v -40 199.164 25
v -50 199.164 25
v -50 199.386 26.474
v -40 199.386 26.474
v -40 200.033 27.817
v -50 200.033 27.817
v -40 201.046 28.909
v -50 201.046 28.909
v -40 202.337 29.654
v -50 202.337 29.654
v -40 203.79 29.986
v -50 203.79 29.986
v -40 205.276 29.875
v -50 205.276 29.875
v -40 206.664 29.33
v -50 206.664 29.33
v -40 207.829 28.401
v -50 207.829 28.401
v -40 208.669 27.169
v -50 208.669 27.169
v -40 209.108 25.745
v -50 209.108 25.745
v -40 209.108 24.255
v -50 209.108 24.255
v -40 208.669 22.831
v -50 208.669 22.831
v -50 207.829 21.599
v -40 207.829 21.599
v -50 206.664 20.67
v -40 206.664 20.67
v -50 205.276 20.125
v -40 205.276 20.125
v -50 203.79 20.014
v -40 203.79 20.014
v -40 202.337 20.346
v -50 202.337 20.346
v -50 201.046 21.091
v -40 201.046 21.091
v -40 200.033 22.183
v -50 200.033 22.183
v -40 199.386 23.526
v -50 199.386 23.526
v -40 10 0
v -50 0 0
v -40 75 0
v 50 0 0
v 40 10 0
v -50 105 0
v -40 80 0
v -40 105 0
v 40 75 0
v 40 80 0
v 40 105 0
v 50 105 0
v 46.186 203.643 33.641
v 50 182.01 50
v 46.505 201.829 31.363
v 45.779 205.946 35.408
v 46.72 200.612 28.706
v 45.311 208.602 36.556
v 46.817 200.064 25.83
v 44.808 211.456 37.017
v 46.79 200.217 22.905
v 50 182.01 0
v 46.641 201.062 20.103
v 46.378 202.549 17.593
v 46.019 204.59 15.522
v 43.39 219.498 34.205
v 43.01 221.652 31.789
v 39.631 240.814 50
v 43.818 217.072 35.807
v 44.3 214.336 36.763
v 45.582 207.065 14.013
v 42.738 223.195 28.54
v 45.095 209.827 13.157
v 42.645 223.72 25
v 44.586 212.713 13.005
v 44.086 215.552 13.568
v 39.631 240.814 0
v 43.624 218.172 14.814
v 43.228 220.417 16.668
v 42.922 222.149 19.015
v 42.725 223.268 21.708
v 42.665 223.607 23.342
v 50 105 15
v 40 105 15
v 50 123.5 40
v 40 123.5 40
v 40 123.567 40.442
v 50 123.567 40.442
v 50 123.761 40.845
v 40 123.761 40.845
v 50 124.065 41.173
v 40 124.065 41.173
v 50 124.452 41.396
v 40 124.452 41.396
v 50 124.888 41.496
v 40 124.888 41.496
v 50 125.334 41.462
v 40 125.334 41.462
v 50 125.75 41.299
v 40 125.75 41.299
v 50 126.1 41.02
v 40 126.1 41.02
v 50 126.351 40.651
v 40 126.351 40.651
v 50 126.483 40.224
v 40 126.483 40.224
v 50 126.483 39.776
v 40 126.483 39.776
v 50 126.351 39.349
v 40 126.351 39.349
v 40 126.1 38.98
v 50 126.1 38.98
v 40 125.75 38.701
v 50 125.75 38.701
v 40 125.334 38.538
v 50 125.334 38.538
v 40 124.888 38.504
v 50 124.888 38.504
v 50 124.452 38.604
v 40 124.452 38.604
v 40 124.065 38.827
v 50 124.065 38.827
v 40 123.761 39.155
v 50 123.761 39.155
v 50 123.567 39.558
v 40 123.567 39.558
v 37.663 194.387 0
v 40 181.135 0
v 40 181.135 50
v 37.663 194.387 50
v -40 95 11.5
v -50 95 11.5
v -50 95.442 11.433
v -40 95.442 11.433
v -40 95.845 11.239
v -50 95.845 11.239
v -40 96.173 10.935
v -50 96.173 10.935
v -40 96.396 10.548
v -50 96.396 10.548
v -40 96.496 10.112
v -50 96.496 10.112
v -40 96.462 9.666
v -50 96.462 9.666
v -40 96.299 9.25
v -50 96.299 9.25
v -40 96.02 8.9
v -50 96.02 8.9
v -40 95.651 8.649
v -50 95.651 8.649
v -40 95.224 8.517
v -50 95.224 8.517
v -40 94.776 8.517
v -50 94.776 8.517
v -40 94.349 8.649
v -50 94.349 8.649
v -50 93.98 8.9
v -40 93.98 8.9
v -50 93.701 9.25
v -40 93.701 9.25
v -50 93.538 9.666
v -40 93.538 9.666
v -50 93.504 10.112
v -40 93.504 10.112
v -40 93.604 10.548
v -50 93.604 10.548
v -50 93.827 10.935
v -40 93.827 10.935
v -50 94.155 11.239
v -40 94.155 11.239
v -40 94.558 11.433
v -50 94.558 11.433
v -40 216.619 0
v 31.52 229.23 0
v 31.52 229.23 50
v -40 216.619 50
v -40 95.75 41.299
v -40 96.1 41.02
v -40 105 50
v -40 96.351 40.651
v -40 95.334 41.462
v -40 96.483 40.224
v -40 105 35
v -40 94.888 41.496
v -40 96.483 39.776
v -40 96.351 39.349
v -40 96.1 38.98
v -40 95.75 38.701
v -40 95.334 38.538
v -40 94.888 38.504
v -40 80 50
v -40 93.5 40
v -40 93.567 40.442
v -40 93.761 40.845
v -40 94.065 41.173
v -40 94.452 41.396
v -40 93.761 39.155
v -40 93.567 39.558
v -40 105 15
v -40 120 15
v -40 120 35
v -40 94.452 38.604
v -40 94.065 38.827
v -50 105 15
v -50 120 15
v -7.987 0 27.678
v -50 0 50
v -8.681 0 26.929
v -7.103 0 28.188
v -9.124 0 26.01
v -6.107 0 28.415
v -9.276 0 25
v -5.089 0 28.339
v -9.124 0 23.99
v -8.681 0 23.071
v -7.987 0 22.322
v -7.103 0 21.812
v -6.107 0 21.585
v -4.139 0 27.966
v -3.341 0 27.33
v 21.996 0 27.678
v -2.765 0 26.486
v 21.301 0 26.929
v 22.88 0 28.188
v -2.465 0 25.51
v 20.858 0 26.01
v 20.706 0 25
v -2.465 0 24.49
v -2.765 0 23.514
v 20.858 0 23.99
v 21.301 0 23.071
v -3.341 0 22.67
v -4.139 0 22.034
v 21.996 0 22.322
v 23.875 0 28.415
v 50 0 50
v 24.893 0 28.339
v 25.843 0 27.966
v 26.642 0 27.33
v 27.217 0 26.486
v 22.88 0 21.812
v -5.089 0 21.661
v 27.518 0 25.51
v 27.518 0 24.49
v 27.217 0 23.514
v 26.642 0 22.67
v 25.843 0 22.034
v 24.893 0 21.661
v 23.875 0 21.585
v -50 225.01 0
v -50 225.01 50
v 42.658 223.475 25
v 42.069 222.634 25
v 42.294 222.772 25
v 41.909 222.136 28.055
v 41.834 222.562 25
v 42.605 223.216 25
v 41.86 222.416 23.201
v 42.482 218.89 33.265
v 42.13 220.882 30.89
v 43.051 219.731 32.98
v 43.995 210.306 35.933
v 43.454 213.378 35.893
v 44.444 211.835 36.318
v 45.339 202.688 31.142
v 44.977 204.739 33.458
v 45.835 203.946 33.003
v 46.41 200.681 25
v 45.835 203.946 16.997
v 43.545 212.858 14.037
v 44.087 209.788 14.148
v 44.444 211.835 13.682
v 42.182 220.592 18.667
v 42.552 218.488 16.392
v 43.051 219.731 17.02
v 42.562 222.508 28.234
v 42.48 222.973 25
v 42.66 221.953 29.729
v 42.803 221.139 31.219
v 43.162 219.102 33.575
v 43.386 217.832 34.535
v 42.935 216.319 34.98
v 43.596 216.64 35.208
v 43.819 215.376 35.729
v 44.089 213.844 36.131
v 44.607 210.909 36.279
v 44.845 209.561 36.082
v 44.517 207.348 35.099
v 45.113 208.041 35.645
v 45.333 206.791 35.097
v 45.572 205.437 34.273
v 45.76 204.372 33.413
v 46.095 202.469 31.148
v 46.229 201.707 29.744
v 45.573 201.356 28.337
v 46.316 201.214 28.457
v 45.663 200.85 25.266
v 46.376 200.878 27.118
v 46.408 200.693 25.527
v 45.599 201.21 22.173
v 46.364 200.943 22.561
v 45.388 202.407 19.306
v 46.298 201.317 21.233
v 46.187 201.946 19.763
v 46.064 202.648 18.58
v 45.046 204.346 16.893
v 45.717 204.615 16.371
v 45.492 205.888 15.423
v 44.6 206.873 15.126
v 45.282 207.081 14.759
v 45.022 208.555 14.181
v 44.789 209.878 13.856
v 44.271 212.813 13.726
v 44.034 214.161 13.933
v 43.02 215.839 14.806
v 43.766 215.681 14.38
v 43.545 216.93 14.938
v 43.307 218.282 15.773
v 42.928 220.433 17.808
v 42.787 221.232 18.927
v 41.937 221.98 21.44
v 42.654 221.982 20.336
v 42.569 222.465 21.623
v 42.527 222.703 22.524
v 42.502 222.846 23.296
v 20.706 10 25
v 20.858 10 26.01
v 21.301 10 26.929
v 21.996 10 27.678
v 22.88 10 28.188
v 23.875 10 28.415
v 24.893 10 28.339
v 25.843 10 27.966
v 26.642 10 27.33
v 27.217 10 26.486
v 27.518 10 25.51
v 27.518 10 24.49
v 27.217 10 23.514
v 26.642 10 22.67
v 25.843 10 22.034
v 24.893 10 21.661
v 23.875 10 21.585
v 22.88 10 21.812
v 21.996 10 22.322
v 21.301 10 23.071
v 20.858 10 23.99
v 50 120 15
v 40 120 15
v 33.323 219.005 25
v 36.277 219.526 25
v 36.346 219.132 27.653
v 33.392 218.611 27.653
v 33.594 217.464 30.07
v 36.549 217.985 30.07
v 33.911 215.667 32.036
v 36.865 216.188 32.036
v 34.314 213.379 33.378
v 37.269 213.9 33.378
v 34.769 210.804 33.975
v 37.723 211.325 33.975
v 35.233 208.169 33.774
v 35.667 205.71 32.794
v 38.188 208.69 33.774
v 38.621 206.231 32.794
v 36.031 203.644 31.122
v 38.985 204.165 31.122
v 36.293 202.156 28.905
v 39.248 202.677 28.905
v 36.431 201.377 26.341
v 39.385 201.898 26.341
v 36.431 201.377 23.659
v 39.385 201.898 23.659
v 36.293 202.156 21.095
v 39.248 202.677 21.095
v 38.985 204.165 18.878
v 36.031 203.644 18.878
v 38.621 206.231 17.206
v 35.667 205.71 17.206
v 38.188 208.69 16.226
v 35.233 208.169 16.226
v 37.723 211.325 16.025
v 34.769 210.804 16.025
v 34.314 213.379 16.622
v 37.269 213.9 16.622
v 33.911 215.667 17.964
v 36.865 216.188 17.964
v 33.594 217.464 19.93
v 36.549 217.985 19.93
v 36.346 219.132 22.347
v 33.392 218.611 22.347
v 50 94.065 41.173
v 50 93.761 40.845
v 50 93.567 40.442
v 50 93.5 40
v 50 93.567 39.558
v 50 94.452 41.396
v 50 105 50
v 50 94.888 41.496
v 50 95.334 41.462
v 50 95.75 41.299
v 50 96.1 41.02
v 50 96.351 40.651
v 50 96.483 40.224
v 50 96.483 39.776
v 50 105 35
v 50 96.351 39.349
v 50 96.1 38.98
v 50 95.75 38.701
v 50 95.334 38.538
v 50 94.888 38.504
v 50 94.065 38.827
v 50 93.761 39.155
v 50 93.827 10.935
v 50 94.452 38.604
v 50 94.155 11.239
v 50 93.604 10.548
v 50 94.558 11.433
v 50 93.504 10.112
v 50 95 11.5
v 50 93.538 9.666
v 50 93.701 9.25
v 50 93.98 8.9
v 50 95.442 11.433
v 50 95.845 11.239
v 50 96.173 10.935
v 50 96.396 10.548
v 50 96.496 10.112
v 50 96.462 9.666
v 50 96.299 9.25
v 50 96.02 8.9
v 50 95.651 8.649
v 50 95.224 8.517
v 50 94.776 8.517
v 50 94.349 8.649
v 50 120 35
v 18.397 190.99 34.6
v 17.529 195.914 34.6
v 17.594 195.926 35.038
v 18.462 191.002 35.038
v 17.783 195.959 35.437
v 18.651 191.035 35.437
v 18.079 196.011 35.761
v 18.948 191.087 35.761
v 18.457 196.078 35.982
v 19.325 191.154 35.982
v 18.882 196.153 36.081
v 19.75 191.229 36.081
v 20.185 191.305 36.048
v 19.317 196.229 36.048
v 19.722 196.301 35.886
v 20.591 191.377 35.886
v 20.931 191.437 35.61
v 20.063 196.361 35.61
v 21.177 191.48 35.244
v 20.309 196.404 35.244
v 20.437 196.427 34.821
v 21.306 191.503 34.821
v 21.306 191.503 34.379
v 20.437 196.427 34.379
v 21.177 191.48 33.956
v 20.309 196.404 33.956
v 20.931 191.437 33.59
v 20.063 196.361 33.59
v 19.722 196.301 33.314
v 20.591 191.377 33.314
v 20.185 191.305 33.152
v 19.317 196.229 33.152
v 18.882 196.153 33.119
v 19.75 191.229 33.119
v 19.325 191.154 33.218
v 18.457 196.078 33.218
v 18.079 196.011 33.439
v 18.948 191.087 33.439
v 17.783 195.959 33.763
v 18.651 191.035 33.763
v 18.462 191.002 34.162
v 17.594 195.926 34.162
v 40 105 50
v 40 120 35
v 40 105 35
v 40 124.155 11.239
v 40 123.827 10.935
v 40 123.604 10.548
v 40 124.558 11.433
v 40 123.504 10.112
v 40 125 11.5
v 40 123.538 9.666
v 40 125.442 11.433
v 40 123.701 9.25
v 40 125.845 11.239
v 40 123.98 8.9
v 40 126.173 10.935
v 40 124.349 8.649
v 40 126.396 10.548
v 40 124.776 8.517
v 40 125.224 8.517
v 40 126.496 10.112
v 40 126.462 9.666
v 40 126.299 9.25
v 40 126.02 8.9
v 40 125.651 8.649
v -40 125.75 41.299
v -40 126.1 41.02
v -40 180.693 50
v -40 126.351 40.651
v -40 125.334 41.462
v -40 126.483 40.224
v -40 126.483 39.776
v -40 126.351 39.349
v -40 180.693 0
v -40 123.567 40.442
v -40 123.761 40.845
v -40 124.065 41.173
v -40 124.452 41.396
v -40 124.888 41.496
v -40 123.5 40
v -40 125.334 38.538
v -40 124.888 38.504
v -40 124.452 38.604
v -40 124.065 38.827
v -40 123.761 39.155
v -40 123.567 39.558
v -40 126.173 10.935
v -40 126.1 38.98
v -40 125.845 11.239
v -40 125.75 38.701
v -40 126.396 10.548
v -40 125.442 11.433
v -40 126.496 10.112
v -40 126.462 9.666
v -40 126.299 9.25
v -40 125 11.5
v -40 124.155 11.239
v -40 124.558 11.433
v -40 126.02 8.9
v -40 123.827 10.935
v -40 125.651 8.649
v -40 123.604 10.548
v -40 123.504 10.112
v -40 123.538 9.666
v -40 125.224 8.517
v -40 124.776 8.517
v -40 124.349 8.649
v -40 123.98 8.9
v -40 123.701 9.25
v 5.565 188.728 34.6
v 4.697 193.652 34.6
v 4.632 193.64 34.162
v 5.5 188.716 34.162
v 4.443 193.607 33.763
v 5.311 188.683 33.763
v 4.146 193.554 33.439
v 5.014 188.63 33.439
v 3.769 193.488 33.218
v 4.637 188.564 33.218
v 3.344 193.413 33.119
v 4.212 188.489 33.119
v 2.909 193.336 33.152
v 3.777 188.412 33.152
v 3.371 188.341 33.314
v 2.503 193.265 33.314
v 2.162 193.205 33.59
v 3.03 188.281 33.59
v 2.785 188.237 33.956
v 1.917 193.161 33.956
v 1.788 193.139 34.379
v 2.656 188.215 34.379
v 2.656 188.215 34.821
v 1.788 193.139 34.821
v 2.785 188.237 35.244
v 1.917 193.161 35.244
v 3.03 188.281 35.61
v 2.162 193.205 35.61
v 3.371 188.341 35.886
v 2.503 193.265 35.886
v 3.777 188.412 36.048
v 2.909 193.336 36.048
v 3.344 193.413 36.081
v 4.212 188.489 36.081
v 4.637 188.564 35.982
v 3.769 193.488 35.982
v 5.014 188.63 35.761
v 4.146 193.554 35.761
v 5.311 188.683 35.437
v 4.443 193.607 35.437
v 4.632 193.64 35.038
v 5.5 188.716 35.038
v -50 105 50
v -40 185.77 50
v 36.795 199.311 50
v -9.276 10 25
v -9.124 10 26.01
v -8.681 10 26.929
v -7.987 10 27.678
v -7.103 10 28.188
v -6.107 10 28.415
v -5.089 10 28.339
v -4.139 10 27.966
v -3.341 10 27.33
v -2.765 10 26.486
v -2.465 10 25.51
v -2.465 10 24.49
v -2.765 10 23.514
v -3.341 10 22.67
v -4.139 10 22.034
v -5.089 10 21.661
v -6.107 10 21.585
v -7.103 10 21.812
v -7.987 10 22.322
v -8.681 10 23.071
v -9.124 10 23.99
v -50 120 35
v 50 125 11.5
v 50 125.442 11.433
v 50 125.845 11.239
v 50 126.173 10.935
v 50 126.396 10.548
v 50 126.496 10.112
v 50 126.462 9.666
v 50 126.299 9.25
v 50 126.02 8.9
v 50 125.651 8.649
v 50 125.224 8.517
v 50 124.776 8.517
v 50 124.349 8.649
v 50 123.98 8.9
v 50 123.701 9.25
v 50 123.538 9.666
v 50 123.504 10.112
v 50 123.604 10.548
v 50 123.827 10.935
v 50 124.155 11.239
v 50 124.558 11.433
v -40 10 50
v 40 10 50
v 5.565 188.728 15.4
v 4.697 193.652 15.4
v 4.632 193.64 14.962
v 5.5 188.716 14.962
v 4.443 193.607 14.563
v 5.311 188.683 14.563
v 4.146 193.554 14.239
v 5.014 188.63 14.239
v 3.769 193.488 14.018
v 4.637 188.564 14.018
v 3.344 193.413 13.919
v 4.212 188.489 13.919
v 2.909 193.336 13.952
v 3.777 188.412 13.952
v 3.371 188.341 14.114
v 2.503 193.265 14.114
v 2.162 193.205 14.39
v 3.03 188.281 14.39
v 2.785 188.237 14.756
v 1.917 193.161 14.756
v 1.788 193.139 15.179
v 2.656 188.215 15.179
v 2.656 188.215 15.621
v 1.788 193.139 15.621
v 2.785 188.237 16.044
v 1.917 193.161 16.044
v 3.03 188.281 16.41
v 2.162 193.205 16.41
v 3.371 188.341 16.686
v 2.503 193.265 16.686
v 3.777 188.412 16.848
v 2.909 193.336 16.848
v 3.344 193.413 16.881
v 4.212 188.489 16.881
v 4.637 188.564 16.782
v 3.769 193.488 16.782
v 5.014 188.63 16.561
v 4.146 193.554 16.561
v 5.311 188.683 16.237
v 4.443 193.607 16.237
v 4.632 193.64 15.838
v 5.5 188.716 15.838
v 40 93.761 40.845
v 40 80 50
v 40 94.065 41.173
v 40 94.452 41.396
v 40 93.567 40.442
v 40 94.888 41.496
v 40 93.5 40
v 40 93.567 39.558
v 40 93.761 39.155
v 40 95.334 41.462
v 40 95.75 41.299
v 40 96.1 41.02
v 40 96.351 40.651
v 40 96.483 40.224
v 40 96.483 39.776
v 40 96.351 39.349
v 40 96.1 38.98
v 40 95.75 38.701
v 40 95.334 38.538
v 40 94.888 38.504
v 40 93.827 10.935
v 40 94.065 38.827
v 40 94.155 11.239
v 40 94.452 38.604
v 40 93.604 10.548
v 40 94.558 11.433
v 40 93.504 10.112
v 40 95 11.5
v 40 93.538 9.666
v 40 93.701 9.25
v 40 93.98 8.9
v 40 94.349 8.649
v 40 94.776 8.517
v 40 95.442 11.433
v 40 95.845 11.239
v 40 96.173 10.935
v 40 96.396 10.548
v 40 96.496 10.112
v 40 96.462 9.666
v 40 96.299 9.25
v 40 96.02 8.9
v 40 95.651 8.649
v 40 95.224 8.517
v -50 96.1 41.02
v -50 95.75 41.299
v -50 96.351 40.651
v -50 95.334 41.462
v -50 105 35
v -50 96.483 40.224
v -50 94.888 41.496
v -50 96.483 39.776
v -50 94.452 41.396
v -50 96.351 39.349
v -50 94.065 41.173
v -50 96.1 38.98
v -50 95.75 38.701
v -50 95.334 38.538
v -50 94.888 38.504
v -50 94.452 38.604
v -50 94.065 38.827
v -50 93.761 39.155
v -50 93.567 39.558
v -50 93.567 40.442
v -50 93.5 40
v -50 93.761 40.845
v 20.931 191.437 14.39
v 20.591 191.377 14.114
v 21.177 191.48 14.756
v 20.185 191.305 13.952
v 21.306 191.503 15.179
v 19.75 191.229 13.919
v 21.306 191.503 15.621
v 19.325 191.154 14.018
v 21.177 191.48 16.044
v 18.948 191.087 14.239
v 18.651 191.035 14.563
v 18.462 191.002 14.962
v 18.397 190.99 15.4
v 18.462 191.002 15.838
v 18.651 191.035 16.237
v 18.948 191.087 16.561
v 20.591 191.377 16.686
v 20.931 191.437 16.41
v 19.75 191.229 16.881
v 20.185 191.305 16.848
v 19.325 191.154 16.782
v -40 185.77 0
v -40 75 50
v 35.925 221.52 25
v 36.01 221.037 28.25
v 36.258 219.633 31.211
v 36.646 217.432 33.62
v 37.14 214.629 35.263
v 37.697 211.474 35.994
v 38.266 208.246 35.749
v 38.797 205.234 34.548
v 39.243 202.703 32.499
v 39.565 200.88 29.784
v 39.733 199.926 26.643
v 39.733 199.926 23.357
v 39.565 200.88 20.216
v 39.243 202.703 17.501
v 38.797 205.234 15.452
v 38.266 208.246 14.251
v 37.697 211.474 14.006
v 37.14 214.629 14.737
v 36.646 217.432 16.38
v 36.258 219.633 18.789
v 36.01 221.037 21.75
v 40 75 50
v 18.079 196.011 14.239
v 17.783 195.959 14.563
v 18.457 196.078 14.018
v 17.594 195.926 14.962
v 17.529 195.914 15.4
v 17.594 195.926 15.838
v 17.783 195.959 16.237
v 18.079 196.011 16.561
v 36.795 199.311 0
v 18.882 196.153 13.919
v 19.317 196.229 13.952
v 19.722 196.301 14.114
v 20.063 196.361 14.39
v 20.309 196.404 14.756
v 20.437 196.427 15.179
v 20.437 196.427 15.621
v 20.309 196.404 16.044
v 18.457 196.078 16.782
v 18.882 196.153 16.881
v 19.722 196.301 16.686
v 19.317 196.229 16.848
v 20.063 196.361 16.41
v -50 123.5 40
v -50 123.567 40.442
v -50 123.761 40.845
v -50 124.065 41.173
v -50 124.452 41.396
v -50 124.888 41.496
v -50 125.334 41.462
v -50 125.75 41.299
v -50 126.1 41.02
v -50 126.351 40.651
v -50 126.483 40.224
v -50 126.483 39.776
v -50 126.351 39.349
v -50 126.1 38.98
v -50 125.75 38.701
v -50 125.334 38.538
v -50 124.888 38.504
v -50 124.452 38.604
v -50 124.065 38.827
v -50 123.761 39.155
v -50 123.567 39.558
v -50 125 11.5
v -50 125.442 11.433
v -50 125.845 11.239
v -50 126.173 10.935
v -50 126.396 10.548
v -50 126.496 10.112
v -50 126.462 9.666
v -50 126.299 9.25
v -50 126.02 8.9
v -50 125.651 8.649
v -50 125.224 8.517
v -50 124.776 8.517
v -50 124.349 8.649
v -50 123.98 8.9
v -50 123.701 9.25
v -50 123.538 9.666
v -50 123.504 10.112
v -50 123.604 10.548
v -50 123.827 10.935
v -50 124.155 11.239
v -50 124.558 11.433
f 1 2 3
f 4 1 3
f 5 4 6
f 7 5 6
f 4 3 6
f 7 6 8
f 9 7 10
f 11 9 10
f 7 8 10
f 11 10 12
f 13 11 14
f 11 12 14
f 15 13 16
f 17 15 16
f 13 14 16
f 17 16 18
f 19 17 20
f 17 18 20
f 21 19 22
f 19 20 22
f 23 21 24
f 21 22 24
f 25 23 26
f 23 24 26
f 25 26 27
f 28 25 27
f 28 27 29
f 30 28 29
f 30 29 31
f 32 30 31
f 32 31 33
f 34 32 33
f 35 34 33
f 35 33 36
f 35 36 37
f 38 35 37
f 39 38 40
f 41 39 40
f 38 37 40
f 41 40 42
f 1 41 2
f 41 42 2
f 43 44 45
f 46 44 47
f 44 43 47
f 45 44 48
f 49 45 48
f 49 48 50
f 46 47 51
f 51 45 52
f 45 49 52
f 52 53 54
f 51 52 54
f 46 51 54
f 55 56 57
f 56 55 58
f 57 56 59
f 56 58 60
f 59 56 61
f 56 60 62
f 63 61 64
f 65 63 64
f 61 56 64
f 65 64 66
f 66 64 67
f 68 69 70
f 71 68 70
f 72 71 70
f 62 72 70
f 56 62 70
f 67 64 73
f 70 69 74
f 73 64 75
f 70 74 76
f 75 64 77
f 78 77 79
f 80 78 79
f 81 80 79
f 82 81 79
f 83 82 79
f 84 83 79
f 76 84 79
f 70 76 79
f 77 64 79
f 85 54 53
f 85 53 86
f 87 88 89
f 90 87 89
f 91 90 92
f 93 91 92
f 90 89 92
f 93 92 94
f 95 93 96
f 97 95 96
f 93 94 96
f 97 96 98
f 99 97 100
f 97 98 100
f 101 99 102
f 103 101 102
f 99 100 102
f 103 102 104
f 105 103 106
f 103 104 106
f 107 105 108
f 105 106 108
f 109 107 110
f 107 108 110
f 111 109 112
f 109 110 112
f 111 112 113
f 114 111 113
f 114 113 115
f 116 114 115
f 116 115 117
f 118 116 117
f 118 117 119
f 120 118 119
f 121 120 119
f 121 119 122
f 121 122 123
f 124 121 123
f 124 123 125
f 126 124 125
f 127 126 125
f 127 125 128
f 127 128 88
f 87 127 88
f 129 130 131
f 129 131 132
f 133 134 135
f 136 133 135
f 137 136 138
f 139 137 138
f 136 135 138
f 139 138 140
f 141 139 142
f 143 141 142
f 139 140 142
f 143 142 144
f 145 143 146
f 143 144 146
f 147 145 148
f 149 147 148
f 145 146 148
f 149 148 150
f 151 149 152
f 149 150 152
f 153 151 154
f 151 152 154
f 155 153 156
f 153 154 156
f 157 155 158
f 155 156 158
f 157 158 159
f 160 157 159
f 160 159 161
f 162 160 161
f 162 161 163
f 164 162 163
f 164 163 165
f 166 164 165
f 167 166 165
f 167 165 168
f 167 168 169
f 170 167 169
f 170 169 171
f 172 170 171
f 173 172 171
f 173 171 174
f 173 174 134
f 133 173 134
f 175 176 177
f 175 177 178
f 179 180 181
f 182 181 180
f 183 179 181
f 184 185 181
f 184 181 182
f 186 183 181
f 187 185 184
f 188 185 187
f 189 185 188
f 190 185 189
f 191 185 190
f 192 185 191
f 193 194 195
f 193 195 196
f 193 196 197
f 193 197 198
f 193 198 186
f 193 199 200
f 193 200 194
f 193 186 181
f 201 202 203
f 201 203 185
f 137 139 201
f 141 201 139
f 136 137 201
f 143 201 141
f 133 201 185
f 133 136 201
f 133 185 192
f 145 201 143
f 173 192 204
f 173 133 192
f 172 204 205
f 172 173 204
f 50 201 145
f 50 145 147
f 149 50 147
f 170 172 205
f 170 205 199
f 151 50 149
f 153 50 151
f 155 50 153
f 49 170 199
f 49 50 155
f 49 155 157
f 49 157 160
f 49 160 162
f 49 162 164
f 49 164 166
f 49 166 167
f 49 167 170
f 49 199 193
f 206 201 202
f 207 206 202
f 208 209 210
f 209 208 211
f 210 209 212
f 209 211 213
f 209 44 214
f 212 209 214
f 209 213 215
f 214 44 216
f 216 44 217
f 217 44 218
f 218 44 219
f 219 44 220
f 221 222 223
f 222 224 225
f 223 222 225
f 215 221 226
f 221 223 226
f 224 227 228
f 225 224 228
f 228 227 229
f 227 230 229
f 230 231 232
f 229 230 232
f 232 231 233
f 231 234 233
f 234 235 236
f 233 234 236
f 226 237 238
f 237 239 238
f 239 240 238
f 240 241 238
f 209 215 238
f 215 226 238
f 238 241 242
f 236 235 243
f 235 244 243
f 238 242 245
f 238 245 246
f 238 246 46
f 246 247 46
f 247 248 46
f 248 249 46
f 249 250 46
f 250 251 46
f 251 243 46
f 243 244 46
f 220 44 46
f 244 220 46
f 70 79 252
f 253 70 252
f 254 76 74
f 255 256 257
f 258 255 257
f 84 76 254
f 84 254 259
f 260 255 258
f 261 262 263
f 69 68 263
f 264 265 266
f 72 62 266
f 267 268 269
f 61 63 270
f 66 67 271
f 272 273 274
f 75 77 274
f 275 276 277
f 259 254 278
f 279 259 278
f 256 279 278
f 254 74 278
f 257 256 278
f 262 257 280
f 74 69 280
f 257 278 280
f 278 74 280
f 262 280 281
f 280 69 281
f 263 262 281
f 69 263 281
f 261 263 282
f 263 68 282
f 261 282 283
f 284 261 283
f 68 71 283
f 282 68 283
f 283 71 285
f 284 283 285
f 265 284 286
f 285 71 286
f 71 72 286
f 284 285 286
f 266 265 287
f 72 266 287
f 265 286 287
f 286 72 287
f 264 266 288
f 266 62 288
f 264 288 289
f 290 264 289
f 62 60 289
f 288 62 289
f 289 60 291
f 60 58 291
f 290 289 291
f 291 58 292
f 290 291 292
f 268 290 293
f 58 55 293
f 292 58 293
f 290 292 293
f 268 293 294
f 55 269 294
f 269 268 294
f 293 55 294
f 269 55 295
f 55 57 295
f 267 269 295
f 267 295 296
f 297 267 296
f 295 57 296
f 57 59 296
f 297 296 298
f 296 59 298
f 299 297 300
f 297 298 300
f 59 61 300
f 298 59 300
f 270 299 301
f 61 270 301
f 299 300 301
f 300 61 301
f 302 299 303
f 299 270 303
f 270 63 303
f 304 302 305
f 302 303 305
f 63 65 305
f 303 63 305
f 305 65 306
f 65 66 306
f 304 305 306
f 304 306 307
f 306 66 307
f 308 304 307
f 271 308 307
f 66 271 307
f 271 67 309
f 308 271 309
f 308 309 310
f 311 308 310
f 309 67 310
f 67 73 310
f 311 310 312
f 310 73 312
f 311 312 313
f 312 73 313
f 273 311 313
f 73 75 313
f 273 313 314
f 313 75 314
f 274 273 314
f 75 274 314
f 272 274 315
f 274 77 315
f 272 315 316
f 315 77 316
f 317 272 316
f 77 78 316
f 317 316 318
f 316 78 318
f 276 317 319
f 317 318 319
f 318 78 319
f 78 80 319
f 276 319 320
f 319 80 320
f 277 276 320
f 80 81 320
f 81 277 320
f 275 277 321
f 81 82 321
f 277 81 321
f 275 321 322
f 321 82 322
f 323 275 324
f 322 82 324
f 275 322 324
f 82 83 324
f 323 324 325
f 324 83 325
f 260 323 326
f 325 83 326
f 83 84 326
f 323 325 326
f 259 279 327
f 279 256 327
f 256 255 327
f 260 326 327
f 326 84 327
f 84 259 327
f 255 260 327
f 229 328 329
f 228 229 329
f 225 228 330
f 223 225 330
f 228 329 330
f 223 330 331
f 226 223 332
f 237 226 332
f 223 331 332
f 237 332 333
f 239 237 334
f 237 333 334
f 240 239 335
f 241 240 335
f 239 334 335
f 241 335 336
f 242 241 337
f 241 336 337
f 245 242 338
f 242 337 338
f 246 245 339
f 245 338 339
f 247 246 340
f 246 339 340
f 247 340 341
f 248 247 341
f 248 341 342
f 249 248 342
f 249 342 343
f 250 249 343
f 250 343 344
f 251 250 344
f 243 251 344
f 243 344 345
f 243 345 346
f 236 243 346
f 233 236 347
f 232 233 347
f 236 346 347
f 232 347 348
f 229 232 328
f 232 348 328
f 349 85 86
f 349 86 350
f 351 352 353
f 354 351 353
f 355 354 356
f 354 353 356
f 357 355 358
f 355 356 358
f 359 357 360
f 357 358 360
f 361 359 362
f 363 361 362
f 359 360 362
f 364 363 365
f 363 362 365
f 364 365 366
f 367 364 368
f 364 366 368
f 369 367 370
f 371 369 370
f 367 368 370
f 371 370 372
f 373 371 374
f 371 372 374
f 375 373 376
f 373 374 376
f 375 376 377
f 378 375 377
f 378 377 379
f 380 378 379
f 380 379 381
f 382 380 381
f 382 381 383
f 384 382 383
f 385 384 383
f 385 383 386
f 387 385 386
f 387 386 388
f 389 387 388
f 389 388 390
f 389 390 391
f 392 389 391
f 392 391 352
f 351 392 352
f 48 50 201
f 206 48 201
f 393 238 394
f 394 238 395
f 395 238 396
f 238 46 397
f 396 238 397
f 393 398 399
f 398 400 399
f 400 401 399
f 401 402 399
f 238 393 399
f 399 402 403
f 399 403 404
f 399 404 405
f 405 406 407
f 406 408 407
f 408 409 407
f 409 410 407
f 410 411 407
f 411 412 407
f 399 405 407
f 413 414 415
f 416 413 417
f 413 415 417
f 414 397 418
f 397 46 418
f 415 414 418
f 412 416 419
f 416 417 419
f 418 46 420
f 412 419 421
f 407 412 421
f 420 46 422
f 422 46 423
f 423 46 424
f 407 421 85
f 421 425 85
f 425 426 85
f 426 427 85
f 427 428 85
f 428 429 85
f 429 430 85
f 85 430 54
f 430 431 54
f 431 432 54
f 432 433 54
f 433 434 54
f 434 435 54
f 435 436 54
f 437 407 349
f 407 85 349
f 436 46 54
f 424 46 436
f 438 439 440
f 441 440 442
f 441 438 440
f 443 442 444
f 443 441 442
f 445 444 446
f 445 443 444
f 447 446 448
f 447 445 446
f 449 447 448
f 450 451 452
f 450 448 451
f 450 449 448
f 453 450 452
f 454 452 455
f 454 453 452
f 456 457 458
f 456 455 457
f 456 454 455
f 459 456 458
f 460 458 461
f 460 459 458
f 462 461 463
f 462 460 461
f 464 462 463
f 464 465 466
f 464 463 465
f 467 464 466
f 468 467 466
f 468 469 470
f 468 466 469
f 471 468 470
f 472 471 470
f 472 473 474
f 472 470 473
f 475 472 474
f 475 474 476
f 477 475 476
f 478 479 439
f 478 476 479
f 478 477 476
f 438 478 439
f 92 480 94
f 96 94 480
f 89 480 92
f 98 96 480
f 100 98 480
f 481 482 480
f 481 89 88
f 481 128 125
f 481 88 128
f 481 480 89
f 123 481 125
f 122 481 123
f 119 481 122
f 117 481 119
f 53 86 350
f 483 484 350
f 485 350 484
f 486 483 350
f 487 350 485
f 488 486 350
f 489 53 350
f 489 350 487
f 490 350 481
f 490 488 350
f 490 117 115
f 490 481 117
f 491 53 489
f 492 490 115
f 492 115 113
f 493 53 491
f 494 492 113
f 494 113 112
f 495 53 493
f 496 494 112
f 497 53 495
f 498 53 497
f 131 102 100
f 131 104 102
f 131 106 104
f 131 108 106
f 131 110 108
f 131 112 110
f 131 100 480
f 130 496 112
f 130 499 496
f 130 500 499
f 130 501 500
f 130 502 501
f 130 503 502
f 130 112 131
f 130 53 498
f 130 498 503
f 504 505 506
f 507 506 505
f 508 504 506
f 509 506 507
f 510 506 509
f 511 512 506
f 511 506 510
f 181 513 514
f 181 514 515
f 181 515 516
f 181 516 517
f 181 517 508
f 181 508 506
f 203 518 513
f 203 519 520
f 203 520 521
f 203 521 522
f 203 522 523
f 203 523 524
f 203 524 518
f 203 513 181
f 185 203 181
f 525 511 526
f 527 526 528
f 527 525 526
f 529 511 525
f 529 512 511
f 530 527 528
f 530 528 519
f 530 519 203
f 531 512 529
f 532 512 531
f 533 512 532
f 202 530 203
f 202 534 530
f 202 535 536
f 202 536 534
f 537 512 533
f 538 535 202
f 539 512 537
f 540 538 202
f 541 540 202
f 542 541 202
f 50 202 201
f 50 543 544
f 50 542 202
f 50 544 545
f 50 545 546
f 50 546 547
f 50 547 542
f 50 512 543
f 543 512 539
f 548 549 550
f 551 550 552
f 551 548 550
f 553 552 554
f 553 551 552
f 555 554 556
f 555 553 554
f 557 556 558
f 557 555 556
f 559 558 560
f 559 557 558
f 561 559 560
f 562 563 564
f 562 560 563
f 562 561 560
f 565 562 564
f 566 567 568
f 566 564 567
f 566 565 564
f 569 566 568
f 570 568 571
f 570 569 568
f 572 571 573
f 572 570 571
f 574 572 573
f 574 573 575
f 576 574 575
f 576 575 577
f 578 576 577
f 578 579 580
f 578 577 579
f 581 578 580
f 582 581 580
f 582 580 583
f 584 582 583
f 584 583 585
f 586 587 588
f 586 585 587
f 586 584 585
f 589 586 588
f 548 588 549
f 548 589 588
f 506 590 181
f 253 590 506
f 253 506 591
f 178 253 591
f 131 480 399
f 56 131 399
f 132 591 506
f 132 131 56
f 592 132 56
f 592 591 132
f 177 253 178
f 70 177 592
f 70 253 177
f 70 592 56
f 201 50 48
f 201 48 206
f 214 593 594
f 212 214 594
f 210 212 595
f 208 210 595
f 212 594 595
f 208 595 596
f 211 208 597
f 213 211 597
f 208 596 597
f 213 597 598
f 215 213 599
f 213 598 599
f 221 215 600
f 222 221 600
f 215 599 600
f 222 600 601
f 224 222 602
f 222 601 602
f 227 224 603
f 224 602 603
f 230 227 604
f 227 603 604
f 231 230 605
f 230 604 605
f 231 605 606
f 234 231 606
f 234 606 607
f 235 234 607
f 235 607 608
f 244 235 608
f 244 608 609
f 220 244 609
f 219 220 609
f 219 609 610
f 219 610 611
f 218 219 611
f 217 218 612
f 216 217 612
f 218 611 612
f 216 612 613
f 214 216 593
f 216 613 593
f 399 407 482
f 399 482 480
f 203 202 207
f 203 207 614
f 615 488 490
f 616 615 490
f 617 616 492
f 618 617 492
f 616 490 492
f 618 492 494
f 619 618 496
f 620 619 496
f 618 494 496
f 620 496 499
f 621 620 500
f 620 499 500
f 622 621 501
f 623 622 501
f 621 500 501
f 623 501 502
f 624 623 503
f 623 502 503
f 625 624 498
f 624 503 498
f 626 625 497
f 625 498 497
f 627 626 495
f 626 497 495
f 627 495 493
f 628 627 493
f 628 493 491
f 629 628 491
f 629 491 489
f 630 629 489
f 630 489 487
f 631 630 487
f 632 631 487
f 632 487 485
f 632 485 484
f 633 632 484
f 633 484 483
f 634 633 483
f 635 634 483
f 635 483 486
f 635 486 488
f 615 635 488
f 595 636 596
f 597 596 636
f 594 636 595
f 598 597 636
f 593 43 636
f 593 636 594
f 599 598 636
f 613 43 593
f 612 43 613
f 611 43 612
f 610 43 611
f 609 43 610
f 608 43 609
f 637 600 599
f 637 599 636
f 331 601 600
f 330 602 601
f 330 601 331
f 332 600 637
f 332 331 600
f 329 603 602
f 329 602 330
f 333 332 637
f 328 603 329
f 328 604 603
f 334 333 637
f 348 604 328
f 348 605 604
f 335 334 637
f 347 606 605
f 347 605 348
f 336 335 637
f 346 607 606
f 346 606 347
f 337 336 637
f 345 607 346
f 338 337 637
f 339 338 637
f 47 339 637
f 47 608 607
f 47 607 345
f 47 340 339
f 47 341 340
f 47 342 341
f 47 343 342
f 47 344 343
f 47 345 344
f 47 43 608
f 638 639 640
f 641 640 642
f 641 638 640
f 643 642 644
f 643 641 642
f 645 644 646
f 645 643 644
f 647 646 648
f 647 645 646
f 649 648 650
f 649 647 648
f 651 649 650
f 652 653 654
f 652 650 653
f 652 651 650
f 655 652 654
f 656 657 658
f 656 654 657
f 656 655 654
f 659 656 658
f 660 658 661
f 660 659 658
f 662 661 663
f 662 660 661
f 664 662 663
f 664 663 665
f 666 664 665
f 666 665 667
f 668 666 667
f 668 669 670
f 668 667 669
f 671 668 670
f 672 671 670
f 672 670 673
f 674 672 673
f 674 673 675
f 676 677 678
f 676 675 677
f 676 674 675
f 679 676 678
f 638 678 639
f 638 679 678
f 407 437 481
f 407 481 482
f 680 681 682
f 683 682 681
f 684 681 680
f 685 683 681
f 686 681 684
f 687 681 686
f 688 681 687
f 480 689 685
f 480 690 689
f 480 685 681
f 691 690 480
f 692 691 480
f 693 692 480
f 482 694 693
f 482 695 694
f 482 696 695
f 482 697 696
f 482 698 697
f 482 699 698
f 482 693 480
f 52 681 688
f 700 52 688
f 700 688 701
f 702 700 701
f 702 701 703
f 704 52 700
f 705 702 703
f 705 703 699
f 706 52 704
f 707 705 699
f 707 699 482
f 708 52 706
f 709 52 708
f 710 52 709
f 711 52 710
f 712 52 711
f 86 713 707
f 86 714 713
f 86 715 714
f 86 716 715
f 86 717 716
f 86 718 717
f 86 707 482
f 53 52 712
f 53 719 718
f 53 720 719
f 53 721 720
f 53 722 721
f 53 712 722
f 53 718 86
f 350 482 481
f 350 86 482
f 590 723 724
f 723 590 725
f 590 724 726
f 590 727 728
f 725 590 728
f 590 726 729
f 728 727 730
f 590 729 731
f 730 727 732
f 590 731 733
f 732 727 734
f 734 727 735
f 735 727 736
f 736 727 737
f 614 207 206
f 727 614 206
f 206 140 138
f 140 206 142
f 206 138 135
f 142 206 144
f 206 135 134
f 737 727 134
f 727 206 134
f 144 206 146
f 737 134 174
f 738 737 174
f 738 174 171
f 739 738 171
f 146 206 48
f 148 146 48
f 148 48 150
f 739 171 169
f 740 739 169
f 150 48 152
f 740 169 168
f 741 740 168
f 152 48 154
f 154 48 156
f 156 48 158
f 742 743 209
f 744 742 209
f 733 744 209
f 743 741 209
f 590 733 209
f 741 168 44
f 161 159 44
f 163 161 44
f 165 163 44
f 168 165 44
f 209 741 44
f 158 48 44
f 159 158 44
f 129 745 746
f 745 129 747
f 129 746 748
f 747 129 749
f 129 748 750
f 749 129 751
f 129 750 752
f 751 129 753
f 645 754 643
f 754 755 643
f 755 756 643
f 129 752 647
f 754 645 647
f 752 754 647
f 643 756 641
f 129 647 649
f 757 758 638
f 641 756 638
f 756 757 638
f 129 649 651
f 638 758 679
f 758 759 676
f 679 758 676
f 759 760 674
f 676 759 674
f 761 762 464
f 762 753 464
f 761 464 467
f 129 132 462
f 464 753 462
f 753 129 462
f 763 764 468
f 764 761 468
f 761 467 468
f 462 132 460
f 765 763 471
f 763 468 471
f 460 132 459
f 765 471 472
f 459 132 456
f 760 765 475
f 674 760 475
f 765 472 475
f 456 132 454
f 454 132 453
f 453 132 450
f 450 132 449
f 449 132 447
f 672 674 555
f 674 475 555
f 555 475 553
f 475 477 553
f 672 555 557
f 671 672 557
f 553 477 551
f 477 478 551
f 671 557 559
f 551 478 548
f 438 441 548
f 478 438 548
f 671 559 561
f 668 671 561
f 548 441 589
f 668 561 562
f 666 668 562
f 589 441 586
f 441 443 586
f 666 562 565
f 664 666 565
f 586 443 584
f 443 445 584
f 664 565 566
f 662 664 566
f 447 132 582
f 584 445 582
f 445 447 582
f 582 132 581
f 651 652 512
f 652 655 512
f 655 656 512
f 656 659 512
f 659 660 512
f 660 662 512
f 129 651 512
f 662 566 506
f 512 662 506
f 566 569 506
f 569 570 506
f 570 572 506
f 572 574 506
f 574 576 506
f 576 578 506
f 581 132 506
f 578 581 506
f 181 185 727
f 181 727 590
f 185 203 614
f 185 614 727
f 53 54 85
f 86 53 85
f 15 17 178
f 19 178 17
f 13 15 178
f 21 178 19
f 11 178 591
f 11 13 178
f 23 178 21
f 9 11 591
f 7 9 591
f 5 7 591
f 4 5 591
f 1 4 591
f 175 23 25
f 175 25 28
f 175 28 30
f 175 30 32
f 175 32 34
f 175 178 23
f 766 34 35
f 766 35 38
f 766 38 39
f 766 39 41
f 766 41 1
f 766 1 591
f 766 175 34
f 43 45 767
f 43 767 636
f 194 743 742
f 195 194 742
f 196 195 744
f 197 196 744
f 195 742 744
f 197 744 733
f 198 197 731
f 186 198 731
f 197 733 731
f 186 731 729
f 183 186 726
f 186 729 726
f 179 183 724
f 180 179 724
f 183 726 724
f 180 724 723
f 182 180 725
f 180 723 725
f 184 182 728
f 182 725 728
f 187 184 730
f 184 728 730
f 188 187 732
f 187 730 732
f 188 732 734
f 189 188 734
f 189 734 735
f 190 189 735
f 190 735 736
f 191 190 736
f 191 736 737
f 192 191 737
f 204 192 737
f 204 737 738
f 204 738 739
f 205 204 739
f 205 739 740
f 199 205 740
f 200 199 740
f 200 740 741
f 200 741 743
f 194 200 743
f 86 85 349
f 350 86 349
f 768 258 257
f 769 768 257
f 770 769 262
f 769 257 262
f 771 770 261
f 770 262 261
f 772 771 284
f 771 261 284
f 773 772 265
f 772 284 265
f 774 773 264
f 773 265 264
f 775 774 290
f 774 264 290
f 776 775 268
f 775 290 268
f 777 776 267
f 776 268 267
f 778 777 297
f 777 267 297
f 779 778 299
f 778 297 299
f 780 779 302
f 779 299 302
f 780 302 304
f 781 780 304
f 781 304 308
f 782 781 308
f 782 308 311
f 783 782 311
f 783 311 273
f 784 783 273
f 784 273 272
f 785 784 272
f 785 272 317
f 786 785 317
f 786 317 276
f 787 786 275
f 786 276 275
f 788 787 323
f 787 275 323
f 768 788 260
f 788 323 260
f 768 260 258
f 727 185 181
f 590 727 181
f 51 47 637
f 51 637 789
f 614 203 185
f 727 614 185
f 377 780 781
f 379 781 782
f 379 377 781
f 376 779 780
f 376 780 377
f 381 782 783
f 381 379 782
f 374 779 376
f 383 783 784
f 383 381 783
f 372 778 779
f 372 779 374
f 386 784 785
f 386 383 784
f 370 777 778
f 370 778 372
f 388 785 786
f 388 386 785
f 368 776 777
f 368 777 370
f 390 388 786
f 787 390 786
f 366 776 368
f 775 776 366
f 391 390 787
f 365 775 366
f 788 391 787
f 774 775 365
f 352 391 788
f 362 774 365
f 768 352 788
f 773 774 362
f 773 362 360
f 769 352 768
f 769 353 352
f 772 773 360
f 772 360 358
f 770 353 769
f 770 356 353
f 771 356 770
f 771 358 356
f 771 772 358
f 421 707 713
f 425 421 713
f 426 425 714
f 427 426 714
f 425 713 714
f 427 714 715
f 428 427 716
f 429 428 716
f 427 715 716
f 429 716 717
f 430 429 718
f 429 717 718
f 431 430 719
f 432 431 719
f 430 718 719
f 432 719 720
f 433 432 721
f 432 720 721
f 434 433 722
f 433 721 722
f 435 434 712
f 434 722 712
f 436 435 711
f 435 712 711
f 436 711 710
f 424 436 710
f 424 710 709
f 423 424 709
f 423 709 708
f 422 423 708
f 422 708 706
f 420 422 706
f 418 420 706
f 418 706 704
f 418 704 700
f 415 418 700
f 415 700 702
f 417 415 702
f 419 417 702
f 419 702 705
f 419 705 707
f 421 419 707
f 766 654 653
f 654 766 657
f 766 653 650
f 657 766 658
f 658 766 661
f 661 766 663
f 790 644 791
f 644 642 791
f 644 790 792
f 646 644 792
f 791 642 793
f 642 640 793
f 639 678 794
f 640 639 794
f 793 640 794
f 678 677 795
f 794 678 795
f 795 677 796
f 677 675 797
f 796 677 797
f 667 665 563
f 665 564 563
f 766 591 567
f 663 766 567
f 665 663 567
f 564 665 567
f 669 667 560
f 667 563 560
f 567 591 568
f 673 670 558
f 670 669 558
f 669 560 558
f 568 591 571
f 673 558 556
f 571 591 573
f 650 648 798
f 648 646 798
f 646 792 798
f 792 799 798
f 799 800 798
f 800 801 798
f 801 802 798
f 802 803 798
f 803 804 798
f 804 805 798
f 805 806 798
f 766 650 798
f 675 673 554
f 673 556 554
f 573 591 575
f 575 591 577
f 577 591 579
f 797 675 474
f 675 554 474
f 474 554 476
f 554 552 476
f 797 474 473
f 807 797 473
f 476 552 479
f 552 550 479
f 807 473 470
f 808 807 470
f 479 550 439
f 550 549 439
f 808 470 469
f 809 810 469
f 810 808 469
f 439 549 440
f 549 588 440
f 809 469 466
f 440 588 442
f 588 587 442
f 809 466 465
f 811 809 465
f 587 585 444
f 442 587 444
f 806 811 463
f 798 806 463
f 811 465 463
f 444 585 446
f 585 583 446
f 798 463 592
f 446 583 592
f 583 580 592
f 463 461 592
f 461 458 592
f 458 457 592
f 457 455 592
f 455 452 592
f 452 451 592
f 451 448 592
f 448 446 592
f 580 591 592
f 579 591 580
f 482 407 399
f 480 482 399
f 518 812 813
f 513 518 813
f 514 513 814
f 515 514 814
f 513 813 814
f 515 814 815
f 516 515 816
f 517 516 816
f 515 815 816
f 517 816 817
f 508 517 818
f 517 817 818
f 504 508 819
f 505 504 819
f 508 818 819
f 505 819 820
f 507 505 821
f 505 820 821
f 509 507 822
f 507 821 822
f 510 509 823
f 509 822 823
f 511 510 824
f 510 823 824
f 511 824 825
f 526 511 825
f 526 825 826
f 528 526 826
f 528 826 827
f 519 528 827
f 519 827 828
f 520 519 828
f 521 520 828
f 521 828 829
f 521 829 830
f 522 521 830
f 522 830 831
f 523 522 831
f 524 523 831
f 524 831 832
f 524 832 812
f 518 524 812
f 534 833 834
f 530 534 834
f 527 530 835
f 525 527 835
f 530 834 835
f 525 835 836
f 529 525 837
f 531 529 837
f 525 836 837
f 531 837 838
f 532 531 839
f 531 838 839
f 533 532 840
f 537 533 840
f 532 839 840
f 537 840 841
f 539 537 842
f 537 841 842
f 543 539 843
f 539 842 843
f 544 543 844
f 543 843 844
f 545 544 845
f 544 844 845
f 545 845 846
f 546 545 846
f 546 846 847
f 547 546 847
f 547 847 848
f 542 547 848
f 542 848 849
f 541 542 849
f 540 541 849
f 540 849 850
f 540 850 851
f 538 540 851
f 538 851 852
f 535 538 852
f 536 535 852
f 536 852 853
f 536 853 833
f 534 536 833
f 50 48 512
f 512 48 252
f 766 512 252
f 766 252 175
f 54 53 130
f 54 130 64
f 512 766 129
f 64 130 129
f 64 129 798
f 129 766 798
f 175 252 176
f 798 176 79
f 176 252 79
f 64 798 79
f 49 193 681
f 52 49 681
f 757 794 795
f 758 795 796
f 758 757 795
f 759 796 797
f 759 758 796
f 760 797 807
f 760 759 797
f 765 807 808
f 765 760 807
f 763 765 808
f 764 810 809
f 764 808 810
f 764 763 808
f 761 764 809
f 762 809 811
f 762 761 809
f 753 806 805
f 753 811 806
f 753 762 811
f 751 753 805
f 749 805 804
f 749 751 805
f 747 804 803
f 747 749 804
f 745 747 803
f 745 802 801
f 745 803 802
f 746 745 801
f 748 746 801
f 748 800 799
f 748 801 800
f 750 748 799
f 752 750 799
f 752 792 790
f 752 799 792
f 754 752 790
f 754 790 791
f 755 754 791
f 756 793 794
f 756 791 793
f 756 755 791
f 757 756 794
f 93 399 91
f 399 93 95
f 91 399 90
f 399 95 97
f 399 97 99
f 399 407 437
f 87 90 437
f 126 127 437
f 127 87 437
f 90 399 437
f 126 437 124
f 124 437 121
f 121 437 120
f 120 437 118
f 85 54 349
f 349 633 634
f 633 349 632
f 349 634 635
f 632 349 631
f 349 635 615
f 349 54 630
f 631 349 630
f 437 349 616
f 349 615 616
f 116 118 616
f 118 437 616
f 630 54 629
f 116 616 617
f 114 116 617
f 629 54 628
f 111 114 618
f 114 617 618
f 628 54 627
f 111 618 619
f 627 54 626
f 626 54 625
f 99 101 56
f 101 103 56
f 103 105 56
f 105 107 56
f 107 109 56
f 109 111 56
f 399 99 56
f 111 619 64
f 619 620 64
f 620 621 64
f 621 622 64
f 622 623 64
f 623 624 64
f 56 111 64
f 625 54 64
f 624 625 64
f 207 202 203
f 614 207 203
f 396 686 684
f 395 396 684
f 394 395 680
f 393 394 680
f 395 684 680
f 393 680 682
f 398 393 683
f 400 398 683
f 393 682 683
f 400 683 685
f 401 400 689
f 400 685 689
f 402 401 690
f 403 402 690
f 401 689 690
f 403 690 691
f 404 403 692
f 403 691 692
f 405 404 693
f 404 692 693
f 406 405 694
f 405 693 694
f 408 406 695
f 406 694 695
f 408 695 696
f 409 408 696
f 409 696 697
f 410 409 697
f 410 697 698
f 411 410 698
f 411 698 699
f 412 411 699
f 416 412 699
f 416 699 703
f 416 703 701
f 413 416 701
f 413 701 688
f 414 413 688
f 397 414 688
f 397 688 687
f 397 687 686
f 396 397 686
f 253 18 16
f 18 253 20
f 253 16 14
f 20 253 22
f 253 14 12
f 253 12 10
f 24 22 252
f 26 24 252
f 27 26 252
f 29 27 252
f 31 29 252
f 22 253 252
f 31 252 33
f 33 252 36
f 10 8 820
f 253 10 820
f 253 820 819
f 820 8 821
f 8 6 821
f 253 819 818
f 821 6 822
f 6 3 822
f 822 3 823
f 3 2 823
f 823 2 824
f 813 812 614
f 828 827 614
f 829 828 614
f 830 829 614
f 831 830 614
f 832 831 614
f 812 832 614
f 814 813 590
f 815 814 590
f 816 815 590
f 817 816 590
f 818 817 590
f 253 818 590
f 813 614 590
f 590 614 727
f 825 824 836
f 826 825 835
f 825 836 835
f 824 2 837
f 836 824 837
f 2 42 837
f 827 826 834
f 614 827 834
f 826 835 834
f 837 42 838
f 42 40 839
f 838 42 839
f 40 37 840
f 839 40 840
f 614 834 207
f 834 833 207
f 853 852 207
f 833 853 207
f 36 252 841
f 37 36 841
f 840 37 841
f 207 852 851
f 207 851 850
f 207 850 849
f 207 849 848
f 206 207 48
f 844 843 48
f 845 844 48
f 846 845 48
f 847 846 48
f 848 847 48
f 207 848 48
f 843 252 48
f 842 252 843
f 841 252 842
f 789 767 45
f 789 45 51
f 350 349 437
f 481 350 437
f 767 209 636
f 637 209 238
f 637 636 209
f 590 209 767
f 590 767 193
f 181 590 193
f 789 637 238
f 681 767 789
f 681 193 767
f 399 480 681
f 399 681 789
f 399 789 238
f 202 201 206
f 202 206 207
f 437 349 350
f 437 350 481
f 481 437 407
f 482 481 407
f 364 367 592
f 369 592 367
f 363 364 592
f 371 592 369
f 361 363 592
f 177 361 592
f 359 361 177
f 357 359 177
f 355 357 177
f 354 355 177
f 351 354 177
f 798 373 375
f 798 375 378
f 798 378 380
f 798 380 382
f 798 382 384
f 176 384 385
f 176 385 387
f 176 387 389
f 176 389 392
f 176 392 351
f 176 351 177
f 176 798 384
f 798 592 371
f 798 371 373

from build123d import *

# Parameters (mm, degrees)
BOSS_EXTRUDE1_DEPTH    = 50
SKETCH4_R              = 11.025
CUT_EXTRUDE1_DEPTH     = 7
SKETCH5_R              = 9
CUT_EXTRUDE2_DEPTH     = 7
BOSS_EXTRUDE2_DEPTH    = 50
SKETCH8_R              = 5
CUT_EXTRUDE3_DEPTH     = 10
CUT_EXTRUDE4_REACH     = 278.388
SKETCH9_R              = 1.485
SKETCH10_R             = 3.425
CUT_EXTRUDE5_DEPTH     = 10
SKETCH11_W             = 80
SKETCH11_H             = 5
BOSS_EXTRUDE3_DEPTH    = 50
FILLET1_R              = 1
SKETCH14_R             = 1.5
CUT_EXTRUDE6_DEPTH     = 266.502494397
SPLIT1_SURFACE_1_BACK  = 266.502
SPLIT1_SURFACE_1_DEPTH = 533.004
SPLIT1_SURFACE_2_BACK  = 266.502
SPLIT1_SURFACE_2_DEPTH = 533.004


with BuildPart() as part:
    # Sketch2 → Boss-Extrude1 (new body)
    with BuildSketch(Plane.XY):
        Polygon((-50, 225.01), (-50, 0), (50, 0), (50, 182.01), (39.631197958, 240.814398513), align=None)
        Polygon((-40, 216.619003688), (-40, 10), (40, 10), (40, 181.135113365), (31.519602204, 229.229839206), align=None, mode=Mode.SUBTRACT)
    extrude(amount=BOSS_EXTRUDE1_DEPTH)

    # Sketch4 → Cut-Extrude1 (cut)
    with BuildSketch(Plane(origin=(79.617858663, 14.038776629, 0), x_dir=(0, 0, -1), z_dir=(0.9848077530122079, 0.17364817766693136, 0))):
        with Locations(Location((-25, 200.891001389, 0), (0, 0, 90))):
            Circle(SKETCH4_R)
    extrude(amount=-CUT_EXTRUDE1_DEPTH, mode=Mode.SUBTRACT)

    # Sketch5 → Cut-Extrude2 (cut)
    with BuildSketch(Plane(origin=(72.724204392, 12.823239385, 0), x_dir=(0, 0, -1), z_dir=(0.9848077530122079, 0.17364817766693136, 0))):
        with Locations(Location((-25, 200.891001389, 0), (0, 0, 90))):
            Circle(SKETCH5_R)
    extrude(amount=-CUT_EXTRUDE2_DEPTH, mode=Mode.SUBTRACT)

    # Sketch7 → Boss-Extrude2 (add)
    with BuildSketch(Plane.XY.offset(50)):
        Polygon((36.795033842, 199.31137967), (37.66327473, 194.387340905), (-40, 180.69321016), (-40, 185.770343219), align=None)
    extrude(amount=-BOSS_EXTRUDE2_DEPTH)

    # Sketch8 → Cut-Extrude3 (cut)
    with BuildSketch(Plane.ZY.offset(50)):
        with Locations(Location((25, 204.163858422, 0), (0, 0, 270))):
            Circle(SKETCH8_R)
    extrude(amount=-CUT_EXTRUDE3_DEPTH, mode=Mode.SUBTRACT)

    # Sketch9 → Cut-Extrude4 (cut, up to next)
    with BuildSketch(Plane(origin=(123.233920299, 209.475754475, 0), x_dir=(-0.9848077530122079, -0.17364817766693152, 0), z_dir=(-0.17364817766693152, 0.9848077530122079, 0)), mode=Mode.PRIVATE) as cut_extrude4_sk1:
        with Locations((104.969193438, 15.4)):
            Circle(SKETCH9_R)
    cut_extrude4_tool1 = extrude(cut_extrude4_sk1.sketch, amount=CUT_EXTRUDE4_REACH, mode=Mode.PRIVATE) & part.part
    # Sketch9 → Cut-Extrude4 (cut, up to next)
    with BuildSketch(Plane(origin=(123.233920299, 209.475754475, 0), x_dir=(-0.9848077530122079, -0.17364817766693152, 0), z_dir=(-0.17364817766693152, 0.9848077530122079, 0)), mode=Mode.PRIVATE) as cut_extrude4_sk2:
        with Locations((104.969193438, 34.6)):
            Circle(SKETCH9_R)
    cut_extrude4_tool2 = extrude(cut_extrude4_sk2.sketch, amount=CUT_EXTRUDE4_REACH, mode=Mode.PRIVATE) & part.part
    # Sketch9 → Cut-Extrude4 (cut, up to next)
    with BuildSketch(Plane(origin=(123.233920299, 209.475754475, 0), x_dir=(-0.9848077530122079, -0.17364817766693152, 0), z_dir=(-0.17364817766693152, 0.9848077530122079, 0)), mode=Mode.PRIVATE) as cut_extrude4_sk3:
        with Locations(Location((120.969193438, 34.6, 0), (0, 0, 180))):
            Circle(SKETCH9_R)
    cut_extrude4_tool3 = extrude(cut_extrude4_sk3.sketch, amount=CUT_EXTRUDE4_REACH, mode=Mode.PRIVATE) & part.part
    # Sketch9 → Cut-Extrude4 (cut, up to next)
    with BuildSketch(Plane(origin=(123.233920299, 209.475754475, 0), x_dir=(-0.9848077530122079, -0.17364817766693152, 0), z_dir=(-0.17364817766693152, 0.9848077530122079, 0)), mode=Mode.PRIVATE) as cut_extrude4_sk4:
        with Locations(Location((120.969193438, 15.4, 0), (0, 0, 180))):
            Circle(SKETCH9_R)
    cut_extrude4_tool4 = extrude(cut_extrude4_sk4.sketch, amount=CUT_EXTRUDE4_REACH, mode=Mode.PRIVATE) & part.part
    add(cut_extrude4_tool1.solids().sort_by_distance((19.859445, 191.248045, 15.4))[0], mode=Mode.SUBTRACT)
    add(cut_extrude4_tool2.solids().sort_by_distance((19.859445, 191.248045, 34.6))[0], mode=Mode.SUBTRACT)
    add(cut_extrude4_tool3.solids().sort_by_distance((4.102521, 188.469674, 34.6))[0], mode=Mode.SUBTRACT)
    add(cut_extrude4_tool4.solids().sort_by_distance((4.102521, 188.469674, 15.4))[0], mode=Mode.SUBTRACT)

    # Sketch10 → Cut-Extrude5 (cut)
    with BuildSketch(Plane(origin=(0, 10, 0), x_dir=(1, 0, 0), z_dir=(0, 1, 0))):
        with Locations(Location((-5.851287133, -25, 0), (0, 0, 180))):
            Circle(SKETCH10_R)
        with Locations(Location((24.130974018, -25, 0), (0, 0, 180))):
            Circle(SKETCH10_R)
    extrude(amount=-CUT_EXTRUDE5_DEPTH, mode=Mode.SUBTRACT)

    # Sketch11 → Boss-Extrude3 (add)
    with BuildSketch(Plane.XY.offset(50)):
        with Locations((0, 77.5)):
            Rectangle(SKETCH11_W, SKETCH11_H)
    extrude(amount=-BOSS_EXTRUDE3_DEPTH)

    # Fillet1
    fillet1_edges = [part.edges().sort_by_distance(p)[0] for p in [
        (46.647973521, 201.020286829, 25),
    ]]
    fillet(fillet1_edges, radius=FILLET1_R)

    # Sketch14 → Cut-Extrude6 (cut, through all)
    with BuildSketch(Plane.ZY.offset(50)):
        with Locations(Location((40, 125, 0), (0, 0, 270))):
            Circle(SKETCH14_R)
        with Locations(Location((40, 95, 0), (0, 0, 270))):
            Circle(SKETCH14_R)
        with Locations((10, 95)):
            Circle(SKETCH14_R)
        with Locations((10, 125)):
            Circle(SKETCH14_R)
    extrude(amount=-CUT_EXTRUDE6_DEPTH, mode=Mode.SUBTRACT)


with BuildPart() as body_2:
    # Split1: the piece behind the surface
    add(part.part)
    # Split1 surface: a surface, the sketch's curves swept straight by 533.004 mm
    with BuildLine(Plane.ZY.offset(50).offset(-SPLIT1_SURFACE_1_BACK), mode=Mode.PRIVATE) as split1_surface_1_path:
        Line((0, 105), (15, 105))
        Line((15, 105), (15, 120))
        Line((15, 120), (35, 120))
        Line((35, 120), (35, 105))
        Line((35, 105), (50, 105))
    split1_surface_1 = Shell.extrude(split1_surface_1_path.wire(), (-1 * SPLIT1_SURFACE_1_DEPTH, 0 * SPLIT1_SURFACE_1_DEPTH, 0 * SPLIT1_SURFACE_1_DEPTH))
    split(bisect_by=split1_surface_1, keep=Keep.BOTTOM)


with BuildPart() as part_1:
    add(part.part)

    # Split1: split by a surface, the side it looks to stays
    # Split1 surface: a surface, the sketch's curves swept straight by 533.004 mm
    with BuildLine(Plane.ZY.offset(50).offset(-SPLIT1_SURFACE_2_BACK), mode=Mode.PRIVATE) as split1_surface_2_path:
        Line((0, 105), (15, 105))
        Line((15, 105), (15, 120))
        Line((15, 120), (35, 120))
        Line((35, 120), (35, 105))
        Line((35, 105), (50, 105))
    split1_surface_2 = Shell.extrude(split1_surface_2_path.wire(), (-1 * SPLIT1_SURFACE_2_DEPTH, 0 * SPLIT1_SURFACE_2_DEPTH, 0 * SPLIT1_SURFACE_2_DEPTH))
    split(bisect_by=split1_surface_2, keep=Keep.TOP)


solid = Compound([body_2.part, part_1.part])
